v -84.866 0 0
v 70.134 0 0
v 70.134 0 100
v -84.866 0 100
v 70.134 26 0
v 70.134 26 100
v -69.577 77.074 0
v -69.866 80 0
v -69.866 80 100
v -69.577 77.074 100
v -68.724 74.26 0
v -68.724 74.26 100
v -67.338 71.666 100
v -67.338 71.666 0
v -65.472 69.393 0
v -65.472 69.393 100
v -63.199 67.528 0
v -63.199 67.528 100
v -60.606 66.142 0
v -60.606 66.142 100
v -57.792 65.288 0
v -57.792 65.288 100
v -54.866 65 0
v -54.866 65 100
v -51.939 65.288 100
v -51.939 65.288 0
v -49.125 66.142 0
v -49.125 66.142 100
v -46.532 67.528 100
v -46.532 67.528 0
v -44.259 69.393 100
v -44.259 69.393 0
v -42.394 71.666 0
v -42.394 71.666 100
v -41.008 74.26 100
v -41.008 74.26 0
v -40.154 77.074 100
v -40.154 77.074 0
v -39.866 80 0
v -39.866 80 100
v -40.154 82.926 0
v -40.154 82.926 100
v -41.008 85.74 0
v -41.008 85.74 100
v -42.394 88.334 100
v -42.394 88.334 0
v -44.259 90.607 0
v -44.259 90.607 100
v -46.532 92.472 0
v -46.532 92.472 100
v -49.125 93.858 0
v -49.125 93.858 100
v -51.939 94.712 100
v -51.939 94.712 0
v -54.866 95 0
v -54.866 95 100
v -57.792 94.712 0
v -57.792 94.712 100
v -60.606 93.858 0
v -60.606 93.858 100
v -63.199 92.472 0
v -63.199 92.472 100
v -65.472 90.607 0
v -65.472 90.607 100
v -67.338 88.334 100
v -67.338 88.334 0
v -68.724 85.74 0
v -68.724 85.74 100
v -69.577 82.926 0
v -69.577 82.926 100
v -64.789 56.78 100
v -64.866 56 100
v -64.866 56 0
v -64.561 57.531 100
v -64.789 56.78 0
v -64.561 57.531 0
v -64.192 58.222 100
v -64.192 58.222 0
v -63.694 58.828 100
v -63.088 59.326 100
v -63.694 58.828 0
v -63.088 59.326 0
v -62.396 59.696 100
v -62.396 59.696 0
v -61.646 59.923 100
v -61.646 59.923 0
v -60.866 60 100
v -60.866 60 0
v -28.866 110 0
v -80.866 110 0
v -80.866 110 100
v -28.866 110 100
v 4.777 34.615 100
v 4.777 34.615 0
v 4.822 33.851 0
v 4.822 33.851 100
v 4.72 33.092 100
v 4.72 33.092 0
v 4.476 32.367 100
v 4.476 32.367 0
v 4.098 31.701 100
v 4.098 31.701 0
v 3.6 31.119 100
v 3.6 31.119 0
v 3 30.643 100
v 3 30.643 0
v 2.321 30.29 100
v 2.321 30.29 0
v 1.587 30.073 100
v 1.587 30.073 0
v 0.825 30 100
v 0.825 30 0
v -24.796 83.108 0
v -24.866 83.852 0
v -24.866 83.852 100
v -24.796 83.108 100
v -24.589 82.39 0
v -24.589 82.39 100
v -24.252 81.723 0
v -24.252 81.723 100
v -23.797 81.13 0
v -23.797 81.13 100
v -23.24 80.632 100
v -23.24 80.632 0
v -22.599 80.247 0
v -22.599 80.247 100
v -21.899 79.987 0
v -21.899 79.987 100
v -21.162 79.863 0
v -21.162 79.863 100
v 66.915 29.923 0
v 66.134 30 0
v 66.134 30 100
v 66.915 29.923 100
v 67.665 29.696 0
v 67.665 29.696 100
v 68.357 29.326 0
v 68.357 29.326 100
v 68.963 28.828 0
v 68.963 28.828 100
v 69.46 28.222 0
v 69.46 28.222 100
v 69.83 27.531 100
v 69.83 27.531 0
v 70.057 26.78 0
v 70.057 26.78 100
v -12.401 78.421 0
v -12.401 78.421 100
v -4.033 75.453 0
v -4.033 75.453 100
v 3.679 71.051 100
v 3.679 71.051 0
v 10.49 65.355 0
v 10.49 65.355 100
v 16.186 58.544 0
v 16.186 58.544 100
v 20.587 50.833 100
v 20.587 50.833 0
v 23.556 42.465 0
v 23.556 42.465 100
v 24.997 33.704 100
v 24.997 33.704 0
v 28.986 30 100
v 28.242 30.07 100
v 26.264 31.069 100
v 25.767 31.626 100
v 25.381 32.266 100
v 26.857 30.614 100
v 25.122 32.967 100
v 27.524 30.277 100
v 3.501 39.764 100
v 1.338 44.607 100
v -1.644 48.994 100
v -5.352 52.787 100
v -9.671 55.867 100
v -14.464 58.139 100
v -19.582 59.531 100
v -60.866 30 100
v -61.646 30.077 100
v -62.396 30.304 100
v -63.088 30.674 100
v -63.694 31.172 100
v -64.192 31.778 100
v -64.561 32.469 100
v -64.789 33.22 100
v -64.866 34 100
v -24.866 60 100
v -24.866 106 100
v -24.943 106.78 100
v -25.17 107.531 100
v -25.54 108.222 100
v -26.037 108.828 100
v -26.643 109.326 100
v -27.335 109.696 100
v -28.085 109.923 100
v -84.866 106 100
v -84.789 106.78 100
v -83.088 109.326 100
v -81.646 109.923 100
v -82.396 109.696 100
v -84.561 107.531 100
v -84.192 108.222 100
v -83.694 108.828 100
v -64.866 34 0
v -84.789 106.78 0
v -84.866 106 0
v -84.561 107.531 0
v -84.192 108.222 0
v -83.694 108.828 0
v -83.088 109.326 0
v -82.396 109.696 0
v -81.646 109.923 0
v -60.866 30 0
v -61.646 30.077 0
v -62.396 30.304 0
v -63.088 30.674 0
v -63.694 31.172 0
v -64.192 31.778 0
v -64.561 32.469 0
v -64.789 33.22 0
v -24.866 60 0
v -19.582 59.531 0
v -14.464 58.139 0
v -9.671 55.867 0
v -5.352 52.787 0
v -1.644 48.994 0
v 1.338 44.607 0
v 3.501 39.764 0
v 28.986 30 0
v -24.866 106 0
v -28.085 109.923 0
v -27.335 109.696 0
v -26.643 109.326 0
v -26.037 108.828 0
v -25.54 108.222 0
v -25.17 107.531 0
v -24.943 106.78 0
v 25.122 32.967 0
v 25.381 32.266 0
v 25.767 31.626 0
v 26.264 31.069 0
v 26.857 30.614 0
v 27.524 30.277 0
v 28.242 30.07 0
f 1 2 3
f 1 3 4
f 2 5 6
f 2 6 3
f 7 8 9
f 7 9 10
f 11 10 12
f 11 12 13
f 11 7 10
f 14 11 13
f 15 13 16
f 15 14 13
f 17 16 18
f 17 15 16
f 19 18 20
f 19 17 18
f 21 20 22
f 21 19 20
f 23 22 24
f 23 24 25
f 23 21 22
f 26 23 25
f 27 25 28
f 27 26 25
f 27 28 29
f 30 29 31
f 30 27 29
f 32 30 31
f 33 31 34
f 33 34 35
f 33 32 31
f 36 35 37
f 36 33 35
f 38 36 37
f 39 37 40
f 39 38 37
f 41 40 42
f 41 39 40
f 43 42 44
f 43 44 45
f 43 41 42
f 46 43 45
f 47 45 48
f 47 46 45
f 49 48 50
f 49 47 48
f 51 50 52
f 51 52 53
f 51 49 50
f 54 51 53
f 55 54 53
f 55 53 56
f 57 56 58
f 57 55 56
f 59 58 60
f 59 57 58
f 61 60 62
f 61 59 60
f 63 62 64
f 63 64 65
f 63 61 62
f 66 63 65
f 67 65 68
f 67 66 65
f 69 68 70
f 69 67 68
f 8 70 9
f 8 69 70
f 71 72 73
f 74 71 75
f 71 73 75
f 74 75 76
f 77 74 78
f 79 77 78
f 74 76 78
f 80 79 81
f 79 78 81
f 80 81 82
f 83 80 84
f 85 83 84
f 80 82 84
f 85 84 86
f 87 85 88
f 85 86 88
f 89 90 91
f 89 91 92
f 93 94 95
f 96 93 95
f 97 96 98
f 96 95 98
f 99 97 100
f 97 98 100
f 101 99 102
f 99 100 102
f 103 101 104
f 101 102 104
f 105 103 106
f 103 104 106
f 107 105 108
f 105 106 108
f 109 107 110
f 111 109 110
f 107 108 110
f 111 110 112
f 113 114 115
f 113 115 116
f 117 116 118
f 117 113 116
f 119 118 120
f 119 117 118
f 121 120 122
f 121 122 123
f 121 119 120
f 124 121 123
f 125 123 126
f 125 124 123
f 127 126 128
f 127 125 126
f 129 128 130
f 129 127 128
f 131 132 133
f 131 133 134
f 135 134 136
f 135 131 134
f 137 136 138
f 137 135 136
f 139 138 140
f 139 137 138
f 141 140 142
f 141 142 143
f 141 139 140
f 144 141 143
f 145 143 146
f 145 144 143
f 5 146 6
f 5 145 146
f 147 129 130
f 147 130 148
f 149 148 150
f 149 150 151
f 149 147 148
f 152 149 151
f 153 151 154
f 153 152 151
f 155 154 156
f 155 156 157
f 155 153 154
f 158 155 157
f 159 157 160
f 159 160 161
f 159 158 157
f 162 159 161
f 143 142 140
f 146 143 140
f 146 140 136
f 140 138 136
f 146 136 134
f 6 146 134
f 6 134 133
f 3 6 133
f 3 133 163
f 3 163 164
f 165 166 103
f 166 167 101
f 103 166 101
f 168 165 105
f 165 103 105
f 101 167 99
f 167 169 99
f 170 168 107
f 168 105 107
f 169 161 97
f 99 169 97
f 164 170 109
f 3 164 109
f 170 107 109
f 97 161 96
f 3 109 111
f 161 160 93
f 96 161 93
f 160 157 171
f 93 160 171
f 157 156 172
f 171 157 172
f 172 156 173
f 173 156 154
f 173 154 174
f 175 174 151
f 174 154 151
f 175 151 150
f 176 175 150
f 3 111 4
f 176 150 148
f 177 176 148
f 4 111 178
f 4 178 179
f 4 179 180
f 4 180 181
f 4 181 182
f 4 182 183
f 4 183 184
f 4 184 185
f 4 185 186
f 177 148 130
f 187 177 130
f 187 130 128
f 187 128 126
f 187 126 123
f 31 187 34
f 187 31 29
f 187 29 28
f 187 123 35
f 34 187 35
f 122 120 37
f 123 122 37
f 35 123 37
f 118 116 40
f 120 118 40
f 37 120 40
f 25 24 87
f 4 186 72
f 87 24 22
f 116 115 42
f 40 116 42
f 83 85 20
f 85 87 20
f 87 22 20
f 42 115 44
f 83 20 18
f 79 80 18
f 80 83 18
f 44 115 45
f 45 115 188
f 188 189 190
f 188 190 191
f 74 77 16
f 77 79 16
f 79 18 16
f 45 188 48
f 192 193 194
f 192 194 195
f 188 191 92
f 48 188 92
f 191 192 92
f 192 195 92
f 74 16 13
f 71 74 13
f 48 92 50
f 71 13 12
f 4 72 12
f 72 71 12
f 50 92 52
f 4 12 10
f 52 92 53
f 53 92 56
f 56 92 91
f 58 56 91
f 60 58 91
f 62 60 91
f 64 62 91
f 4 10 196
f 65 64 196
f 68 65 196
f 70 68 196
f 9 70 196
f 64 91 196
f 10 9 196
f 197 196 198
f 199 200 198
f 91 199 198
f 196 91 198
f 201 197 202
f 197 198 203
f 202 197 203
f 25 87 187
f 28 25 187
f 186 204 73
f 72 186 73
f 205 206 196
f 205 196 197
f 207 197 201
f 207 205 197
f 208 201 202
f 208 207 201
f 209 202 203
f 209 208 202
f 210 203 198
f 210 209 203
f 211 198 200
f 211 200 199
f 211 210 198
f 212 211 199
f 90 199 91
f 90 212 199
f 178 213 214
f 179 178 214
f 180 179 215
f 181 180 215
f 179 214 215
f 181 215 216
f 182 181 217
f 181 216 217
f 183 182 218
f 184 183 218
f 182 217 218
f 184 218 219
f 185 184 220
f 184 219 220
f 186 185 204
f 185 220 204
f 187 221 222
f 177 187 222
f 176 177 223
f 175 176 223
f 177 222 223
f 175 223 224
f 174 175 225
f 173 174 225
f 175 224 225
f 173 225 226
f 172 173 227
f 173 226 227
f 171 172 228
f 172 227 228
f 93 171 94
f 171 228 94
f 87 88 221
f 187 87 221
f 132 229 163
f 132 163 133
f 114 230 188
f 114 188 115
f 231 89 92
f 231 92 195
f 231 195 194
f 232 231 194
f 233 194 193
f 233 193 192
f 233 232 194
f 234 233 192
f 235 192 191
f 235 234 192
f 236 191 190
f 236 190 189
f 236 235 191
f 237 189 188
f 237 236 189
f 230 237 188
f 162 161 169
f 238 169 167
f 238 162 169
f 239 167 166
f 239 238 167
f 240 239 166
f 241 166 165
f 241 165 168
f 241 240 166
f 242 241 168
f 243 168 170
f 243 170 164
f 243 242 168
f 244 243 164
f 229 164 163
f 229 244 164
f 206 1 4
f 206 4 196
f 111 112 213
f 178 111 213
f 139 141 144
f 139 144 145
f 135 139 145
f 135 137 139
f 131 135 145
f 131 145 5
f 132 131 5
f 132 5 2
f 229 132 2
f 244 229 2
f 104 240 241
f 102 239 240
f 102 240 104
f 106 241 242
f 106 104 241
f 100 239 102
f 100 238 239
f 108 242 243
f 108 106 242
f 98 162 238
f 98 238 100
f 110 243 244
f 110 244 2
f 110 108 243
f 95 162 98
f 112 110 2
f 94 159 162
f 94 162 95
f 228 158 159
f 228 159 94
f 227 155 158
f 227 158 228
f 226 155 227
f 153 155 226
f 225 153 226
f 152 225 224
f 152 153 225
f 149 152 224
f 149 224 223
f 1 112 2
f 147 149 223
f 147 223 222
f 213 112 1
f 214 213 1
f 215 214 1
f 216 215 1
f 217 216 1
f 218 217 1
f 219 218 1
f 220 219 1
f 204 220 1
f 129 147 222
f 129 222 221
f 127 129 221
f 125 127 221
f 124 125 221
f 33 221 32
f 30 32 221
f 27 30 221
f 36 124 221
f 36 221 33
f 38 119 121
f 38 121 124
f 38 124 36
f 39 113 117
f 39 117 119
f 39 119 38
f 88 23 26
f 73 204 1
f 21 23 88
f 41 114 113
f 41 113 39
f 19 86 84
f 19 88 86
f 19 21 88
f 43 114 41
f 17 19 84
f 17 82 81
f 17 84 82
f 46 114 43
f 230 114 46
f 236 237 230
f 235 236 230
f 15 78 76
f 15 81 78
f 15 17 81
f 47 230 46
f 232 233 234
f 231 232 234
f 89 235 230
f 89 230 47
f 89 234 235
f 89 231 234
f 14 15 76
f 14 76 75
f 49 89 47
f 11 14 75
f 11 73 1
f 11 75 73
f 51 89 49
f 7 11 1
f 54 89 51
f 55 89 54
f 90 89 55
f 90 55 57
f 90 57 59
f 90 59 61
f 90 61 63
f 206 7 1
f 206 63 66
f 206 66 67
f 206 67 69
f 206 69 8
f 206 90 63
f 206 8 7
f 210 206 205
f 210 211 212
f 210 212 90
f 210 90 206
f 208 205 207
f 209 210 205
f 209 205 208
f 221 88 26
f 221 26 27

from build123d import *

# Parameters (mm, degrees)
SKETCH1_R           = 15
BOSS_EXTRUDE1_DEPTH = 100


with BuildPart() as part:
    # Sketch1 → Boss-Extrude1 (new body)
    with BuildSketch(Plane.XY):
        with BuildLine():
            Line((70.134297521, 0), (-84.865702479, 0))
            Line((-84.865702479, 0), (-84.865702479, 106))
            ThreePointArc((-84.865702479, 106), (-83.694129604, 108.828427125), (-80.865702479, 110))
            Line((-80.865702479, 110), (-28.865702479, 110))
            ThreePointArc((-28.865702479, 110), (-26.037275355, 108.828427125), (-24.865702479, 106))
            Line((-24.865702479, 106), (-24.865702479, 83.851648071))
            ThreePointArc((-24.865702479, 83.851648071), (-23.797014915, 81.129992802), (-21.161998776, 79.862637103))
            ThreePointArc((-21.161998776, 79.862637103), (10.48963658, 65.355339059), (24.996934624, 33.703703704))
            ThreePointArc((24.996934624, 33.703703704), (26.264290322, 31.068687565), (28.985945592, 30))
            Line((28.985945592, 30), (66.134297521, 30))
            ThreePointArc((66.134297521, 30), (68.962724645, 28.828427125), (70.134297521, 26))
            Line((70.134297521, 26), (70.134297521, 0))
        make_face()
        with Locations(Location((-54.865702479, 80, 0), (0, 0, 180))):
            Circle(SKETCH1_R, mode=Mode.SUBTRACT)
        with BuildLine():
            Line((0.824762678, 30), (-60.865702479, 30))
            ThreePointArc((-60.865702479, 30), (-63.694129604, 31.171572875), (-64.865702479, 34))
            Line((-64.865702479, 34), (-64.865702479, 56))
            ThreePointArc((-64.865702479, 56), (-63.694129604, 58.828427125), (-60.865702479, 60))
            Line((-60.865702479, 60), (-24.865702479, 60))
            ThreePointArc((-24.865702479, 60), (-5.352393412, 52.786635759), (4.777141933, 34.615384615))
            ThreePointArc((4.777141933, 34.615384615), (3.862980779, 31.398225458), (0.824762678, 30))
        make_face(mode=Mode.SUBTRACT)
    extrude(amount=BOSS_EXTRUDE1_DEPTH)


solid = part.part
